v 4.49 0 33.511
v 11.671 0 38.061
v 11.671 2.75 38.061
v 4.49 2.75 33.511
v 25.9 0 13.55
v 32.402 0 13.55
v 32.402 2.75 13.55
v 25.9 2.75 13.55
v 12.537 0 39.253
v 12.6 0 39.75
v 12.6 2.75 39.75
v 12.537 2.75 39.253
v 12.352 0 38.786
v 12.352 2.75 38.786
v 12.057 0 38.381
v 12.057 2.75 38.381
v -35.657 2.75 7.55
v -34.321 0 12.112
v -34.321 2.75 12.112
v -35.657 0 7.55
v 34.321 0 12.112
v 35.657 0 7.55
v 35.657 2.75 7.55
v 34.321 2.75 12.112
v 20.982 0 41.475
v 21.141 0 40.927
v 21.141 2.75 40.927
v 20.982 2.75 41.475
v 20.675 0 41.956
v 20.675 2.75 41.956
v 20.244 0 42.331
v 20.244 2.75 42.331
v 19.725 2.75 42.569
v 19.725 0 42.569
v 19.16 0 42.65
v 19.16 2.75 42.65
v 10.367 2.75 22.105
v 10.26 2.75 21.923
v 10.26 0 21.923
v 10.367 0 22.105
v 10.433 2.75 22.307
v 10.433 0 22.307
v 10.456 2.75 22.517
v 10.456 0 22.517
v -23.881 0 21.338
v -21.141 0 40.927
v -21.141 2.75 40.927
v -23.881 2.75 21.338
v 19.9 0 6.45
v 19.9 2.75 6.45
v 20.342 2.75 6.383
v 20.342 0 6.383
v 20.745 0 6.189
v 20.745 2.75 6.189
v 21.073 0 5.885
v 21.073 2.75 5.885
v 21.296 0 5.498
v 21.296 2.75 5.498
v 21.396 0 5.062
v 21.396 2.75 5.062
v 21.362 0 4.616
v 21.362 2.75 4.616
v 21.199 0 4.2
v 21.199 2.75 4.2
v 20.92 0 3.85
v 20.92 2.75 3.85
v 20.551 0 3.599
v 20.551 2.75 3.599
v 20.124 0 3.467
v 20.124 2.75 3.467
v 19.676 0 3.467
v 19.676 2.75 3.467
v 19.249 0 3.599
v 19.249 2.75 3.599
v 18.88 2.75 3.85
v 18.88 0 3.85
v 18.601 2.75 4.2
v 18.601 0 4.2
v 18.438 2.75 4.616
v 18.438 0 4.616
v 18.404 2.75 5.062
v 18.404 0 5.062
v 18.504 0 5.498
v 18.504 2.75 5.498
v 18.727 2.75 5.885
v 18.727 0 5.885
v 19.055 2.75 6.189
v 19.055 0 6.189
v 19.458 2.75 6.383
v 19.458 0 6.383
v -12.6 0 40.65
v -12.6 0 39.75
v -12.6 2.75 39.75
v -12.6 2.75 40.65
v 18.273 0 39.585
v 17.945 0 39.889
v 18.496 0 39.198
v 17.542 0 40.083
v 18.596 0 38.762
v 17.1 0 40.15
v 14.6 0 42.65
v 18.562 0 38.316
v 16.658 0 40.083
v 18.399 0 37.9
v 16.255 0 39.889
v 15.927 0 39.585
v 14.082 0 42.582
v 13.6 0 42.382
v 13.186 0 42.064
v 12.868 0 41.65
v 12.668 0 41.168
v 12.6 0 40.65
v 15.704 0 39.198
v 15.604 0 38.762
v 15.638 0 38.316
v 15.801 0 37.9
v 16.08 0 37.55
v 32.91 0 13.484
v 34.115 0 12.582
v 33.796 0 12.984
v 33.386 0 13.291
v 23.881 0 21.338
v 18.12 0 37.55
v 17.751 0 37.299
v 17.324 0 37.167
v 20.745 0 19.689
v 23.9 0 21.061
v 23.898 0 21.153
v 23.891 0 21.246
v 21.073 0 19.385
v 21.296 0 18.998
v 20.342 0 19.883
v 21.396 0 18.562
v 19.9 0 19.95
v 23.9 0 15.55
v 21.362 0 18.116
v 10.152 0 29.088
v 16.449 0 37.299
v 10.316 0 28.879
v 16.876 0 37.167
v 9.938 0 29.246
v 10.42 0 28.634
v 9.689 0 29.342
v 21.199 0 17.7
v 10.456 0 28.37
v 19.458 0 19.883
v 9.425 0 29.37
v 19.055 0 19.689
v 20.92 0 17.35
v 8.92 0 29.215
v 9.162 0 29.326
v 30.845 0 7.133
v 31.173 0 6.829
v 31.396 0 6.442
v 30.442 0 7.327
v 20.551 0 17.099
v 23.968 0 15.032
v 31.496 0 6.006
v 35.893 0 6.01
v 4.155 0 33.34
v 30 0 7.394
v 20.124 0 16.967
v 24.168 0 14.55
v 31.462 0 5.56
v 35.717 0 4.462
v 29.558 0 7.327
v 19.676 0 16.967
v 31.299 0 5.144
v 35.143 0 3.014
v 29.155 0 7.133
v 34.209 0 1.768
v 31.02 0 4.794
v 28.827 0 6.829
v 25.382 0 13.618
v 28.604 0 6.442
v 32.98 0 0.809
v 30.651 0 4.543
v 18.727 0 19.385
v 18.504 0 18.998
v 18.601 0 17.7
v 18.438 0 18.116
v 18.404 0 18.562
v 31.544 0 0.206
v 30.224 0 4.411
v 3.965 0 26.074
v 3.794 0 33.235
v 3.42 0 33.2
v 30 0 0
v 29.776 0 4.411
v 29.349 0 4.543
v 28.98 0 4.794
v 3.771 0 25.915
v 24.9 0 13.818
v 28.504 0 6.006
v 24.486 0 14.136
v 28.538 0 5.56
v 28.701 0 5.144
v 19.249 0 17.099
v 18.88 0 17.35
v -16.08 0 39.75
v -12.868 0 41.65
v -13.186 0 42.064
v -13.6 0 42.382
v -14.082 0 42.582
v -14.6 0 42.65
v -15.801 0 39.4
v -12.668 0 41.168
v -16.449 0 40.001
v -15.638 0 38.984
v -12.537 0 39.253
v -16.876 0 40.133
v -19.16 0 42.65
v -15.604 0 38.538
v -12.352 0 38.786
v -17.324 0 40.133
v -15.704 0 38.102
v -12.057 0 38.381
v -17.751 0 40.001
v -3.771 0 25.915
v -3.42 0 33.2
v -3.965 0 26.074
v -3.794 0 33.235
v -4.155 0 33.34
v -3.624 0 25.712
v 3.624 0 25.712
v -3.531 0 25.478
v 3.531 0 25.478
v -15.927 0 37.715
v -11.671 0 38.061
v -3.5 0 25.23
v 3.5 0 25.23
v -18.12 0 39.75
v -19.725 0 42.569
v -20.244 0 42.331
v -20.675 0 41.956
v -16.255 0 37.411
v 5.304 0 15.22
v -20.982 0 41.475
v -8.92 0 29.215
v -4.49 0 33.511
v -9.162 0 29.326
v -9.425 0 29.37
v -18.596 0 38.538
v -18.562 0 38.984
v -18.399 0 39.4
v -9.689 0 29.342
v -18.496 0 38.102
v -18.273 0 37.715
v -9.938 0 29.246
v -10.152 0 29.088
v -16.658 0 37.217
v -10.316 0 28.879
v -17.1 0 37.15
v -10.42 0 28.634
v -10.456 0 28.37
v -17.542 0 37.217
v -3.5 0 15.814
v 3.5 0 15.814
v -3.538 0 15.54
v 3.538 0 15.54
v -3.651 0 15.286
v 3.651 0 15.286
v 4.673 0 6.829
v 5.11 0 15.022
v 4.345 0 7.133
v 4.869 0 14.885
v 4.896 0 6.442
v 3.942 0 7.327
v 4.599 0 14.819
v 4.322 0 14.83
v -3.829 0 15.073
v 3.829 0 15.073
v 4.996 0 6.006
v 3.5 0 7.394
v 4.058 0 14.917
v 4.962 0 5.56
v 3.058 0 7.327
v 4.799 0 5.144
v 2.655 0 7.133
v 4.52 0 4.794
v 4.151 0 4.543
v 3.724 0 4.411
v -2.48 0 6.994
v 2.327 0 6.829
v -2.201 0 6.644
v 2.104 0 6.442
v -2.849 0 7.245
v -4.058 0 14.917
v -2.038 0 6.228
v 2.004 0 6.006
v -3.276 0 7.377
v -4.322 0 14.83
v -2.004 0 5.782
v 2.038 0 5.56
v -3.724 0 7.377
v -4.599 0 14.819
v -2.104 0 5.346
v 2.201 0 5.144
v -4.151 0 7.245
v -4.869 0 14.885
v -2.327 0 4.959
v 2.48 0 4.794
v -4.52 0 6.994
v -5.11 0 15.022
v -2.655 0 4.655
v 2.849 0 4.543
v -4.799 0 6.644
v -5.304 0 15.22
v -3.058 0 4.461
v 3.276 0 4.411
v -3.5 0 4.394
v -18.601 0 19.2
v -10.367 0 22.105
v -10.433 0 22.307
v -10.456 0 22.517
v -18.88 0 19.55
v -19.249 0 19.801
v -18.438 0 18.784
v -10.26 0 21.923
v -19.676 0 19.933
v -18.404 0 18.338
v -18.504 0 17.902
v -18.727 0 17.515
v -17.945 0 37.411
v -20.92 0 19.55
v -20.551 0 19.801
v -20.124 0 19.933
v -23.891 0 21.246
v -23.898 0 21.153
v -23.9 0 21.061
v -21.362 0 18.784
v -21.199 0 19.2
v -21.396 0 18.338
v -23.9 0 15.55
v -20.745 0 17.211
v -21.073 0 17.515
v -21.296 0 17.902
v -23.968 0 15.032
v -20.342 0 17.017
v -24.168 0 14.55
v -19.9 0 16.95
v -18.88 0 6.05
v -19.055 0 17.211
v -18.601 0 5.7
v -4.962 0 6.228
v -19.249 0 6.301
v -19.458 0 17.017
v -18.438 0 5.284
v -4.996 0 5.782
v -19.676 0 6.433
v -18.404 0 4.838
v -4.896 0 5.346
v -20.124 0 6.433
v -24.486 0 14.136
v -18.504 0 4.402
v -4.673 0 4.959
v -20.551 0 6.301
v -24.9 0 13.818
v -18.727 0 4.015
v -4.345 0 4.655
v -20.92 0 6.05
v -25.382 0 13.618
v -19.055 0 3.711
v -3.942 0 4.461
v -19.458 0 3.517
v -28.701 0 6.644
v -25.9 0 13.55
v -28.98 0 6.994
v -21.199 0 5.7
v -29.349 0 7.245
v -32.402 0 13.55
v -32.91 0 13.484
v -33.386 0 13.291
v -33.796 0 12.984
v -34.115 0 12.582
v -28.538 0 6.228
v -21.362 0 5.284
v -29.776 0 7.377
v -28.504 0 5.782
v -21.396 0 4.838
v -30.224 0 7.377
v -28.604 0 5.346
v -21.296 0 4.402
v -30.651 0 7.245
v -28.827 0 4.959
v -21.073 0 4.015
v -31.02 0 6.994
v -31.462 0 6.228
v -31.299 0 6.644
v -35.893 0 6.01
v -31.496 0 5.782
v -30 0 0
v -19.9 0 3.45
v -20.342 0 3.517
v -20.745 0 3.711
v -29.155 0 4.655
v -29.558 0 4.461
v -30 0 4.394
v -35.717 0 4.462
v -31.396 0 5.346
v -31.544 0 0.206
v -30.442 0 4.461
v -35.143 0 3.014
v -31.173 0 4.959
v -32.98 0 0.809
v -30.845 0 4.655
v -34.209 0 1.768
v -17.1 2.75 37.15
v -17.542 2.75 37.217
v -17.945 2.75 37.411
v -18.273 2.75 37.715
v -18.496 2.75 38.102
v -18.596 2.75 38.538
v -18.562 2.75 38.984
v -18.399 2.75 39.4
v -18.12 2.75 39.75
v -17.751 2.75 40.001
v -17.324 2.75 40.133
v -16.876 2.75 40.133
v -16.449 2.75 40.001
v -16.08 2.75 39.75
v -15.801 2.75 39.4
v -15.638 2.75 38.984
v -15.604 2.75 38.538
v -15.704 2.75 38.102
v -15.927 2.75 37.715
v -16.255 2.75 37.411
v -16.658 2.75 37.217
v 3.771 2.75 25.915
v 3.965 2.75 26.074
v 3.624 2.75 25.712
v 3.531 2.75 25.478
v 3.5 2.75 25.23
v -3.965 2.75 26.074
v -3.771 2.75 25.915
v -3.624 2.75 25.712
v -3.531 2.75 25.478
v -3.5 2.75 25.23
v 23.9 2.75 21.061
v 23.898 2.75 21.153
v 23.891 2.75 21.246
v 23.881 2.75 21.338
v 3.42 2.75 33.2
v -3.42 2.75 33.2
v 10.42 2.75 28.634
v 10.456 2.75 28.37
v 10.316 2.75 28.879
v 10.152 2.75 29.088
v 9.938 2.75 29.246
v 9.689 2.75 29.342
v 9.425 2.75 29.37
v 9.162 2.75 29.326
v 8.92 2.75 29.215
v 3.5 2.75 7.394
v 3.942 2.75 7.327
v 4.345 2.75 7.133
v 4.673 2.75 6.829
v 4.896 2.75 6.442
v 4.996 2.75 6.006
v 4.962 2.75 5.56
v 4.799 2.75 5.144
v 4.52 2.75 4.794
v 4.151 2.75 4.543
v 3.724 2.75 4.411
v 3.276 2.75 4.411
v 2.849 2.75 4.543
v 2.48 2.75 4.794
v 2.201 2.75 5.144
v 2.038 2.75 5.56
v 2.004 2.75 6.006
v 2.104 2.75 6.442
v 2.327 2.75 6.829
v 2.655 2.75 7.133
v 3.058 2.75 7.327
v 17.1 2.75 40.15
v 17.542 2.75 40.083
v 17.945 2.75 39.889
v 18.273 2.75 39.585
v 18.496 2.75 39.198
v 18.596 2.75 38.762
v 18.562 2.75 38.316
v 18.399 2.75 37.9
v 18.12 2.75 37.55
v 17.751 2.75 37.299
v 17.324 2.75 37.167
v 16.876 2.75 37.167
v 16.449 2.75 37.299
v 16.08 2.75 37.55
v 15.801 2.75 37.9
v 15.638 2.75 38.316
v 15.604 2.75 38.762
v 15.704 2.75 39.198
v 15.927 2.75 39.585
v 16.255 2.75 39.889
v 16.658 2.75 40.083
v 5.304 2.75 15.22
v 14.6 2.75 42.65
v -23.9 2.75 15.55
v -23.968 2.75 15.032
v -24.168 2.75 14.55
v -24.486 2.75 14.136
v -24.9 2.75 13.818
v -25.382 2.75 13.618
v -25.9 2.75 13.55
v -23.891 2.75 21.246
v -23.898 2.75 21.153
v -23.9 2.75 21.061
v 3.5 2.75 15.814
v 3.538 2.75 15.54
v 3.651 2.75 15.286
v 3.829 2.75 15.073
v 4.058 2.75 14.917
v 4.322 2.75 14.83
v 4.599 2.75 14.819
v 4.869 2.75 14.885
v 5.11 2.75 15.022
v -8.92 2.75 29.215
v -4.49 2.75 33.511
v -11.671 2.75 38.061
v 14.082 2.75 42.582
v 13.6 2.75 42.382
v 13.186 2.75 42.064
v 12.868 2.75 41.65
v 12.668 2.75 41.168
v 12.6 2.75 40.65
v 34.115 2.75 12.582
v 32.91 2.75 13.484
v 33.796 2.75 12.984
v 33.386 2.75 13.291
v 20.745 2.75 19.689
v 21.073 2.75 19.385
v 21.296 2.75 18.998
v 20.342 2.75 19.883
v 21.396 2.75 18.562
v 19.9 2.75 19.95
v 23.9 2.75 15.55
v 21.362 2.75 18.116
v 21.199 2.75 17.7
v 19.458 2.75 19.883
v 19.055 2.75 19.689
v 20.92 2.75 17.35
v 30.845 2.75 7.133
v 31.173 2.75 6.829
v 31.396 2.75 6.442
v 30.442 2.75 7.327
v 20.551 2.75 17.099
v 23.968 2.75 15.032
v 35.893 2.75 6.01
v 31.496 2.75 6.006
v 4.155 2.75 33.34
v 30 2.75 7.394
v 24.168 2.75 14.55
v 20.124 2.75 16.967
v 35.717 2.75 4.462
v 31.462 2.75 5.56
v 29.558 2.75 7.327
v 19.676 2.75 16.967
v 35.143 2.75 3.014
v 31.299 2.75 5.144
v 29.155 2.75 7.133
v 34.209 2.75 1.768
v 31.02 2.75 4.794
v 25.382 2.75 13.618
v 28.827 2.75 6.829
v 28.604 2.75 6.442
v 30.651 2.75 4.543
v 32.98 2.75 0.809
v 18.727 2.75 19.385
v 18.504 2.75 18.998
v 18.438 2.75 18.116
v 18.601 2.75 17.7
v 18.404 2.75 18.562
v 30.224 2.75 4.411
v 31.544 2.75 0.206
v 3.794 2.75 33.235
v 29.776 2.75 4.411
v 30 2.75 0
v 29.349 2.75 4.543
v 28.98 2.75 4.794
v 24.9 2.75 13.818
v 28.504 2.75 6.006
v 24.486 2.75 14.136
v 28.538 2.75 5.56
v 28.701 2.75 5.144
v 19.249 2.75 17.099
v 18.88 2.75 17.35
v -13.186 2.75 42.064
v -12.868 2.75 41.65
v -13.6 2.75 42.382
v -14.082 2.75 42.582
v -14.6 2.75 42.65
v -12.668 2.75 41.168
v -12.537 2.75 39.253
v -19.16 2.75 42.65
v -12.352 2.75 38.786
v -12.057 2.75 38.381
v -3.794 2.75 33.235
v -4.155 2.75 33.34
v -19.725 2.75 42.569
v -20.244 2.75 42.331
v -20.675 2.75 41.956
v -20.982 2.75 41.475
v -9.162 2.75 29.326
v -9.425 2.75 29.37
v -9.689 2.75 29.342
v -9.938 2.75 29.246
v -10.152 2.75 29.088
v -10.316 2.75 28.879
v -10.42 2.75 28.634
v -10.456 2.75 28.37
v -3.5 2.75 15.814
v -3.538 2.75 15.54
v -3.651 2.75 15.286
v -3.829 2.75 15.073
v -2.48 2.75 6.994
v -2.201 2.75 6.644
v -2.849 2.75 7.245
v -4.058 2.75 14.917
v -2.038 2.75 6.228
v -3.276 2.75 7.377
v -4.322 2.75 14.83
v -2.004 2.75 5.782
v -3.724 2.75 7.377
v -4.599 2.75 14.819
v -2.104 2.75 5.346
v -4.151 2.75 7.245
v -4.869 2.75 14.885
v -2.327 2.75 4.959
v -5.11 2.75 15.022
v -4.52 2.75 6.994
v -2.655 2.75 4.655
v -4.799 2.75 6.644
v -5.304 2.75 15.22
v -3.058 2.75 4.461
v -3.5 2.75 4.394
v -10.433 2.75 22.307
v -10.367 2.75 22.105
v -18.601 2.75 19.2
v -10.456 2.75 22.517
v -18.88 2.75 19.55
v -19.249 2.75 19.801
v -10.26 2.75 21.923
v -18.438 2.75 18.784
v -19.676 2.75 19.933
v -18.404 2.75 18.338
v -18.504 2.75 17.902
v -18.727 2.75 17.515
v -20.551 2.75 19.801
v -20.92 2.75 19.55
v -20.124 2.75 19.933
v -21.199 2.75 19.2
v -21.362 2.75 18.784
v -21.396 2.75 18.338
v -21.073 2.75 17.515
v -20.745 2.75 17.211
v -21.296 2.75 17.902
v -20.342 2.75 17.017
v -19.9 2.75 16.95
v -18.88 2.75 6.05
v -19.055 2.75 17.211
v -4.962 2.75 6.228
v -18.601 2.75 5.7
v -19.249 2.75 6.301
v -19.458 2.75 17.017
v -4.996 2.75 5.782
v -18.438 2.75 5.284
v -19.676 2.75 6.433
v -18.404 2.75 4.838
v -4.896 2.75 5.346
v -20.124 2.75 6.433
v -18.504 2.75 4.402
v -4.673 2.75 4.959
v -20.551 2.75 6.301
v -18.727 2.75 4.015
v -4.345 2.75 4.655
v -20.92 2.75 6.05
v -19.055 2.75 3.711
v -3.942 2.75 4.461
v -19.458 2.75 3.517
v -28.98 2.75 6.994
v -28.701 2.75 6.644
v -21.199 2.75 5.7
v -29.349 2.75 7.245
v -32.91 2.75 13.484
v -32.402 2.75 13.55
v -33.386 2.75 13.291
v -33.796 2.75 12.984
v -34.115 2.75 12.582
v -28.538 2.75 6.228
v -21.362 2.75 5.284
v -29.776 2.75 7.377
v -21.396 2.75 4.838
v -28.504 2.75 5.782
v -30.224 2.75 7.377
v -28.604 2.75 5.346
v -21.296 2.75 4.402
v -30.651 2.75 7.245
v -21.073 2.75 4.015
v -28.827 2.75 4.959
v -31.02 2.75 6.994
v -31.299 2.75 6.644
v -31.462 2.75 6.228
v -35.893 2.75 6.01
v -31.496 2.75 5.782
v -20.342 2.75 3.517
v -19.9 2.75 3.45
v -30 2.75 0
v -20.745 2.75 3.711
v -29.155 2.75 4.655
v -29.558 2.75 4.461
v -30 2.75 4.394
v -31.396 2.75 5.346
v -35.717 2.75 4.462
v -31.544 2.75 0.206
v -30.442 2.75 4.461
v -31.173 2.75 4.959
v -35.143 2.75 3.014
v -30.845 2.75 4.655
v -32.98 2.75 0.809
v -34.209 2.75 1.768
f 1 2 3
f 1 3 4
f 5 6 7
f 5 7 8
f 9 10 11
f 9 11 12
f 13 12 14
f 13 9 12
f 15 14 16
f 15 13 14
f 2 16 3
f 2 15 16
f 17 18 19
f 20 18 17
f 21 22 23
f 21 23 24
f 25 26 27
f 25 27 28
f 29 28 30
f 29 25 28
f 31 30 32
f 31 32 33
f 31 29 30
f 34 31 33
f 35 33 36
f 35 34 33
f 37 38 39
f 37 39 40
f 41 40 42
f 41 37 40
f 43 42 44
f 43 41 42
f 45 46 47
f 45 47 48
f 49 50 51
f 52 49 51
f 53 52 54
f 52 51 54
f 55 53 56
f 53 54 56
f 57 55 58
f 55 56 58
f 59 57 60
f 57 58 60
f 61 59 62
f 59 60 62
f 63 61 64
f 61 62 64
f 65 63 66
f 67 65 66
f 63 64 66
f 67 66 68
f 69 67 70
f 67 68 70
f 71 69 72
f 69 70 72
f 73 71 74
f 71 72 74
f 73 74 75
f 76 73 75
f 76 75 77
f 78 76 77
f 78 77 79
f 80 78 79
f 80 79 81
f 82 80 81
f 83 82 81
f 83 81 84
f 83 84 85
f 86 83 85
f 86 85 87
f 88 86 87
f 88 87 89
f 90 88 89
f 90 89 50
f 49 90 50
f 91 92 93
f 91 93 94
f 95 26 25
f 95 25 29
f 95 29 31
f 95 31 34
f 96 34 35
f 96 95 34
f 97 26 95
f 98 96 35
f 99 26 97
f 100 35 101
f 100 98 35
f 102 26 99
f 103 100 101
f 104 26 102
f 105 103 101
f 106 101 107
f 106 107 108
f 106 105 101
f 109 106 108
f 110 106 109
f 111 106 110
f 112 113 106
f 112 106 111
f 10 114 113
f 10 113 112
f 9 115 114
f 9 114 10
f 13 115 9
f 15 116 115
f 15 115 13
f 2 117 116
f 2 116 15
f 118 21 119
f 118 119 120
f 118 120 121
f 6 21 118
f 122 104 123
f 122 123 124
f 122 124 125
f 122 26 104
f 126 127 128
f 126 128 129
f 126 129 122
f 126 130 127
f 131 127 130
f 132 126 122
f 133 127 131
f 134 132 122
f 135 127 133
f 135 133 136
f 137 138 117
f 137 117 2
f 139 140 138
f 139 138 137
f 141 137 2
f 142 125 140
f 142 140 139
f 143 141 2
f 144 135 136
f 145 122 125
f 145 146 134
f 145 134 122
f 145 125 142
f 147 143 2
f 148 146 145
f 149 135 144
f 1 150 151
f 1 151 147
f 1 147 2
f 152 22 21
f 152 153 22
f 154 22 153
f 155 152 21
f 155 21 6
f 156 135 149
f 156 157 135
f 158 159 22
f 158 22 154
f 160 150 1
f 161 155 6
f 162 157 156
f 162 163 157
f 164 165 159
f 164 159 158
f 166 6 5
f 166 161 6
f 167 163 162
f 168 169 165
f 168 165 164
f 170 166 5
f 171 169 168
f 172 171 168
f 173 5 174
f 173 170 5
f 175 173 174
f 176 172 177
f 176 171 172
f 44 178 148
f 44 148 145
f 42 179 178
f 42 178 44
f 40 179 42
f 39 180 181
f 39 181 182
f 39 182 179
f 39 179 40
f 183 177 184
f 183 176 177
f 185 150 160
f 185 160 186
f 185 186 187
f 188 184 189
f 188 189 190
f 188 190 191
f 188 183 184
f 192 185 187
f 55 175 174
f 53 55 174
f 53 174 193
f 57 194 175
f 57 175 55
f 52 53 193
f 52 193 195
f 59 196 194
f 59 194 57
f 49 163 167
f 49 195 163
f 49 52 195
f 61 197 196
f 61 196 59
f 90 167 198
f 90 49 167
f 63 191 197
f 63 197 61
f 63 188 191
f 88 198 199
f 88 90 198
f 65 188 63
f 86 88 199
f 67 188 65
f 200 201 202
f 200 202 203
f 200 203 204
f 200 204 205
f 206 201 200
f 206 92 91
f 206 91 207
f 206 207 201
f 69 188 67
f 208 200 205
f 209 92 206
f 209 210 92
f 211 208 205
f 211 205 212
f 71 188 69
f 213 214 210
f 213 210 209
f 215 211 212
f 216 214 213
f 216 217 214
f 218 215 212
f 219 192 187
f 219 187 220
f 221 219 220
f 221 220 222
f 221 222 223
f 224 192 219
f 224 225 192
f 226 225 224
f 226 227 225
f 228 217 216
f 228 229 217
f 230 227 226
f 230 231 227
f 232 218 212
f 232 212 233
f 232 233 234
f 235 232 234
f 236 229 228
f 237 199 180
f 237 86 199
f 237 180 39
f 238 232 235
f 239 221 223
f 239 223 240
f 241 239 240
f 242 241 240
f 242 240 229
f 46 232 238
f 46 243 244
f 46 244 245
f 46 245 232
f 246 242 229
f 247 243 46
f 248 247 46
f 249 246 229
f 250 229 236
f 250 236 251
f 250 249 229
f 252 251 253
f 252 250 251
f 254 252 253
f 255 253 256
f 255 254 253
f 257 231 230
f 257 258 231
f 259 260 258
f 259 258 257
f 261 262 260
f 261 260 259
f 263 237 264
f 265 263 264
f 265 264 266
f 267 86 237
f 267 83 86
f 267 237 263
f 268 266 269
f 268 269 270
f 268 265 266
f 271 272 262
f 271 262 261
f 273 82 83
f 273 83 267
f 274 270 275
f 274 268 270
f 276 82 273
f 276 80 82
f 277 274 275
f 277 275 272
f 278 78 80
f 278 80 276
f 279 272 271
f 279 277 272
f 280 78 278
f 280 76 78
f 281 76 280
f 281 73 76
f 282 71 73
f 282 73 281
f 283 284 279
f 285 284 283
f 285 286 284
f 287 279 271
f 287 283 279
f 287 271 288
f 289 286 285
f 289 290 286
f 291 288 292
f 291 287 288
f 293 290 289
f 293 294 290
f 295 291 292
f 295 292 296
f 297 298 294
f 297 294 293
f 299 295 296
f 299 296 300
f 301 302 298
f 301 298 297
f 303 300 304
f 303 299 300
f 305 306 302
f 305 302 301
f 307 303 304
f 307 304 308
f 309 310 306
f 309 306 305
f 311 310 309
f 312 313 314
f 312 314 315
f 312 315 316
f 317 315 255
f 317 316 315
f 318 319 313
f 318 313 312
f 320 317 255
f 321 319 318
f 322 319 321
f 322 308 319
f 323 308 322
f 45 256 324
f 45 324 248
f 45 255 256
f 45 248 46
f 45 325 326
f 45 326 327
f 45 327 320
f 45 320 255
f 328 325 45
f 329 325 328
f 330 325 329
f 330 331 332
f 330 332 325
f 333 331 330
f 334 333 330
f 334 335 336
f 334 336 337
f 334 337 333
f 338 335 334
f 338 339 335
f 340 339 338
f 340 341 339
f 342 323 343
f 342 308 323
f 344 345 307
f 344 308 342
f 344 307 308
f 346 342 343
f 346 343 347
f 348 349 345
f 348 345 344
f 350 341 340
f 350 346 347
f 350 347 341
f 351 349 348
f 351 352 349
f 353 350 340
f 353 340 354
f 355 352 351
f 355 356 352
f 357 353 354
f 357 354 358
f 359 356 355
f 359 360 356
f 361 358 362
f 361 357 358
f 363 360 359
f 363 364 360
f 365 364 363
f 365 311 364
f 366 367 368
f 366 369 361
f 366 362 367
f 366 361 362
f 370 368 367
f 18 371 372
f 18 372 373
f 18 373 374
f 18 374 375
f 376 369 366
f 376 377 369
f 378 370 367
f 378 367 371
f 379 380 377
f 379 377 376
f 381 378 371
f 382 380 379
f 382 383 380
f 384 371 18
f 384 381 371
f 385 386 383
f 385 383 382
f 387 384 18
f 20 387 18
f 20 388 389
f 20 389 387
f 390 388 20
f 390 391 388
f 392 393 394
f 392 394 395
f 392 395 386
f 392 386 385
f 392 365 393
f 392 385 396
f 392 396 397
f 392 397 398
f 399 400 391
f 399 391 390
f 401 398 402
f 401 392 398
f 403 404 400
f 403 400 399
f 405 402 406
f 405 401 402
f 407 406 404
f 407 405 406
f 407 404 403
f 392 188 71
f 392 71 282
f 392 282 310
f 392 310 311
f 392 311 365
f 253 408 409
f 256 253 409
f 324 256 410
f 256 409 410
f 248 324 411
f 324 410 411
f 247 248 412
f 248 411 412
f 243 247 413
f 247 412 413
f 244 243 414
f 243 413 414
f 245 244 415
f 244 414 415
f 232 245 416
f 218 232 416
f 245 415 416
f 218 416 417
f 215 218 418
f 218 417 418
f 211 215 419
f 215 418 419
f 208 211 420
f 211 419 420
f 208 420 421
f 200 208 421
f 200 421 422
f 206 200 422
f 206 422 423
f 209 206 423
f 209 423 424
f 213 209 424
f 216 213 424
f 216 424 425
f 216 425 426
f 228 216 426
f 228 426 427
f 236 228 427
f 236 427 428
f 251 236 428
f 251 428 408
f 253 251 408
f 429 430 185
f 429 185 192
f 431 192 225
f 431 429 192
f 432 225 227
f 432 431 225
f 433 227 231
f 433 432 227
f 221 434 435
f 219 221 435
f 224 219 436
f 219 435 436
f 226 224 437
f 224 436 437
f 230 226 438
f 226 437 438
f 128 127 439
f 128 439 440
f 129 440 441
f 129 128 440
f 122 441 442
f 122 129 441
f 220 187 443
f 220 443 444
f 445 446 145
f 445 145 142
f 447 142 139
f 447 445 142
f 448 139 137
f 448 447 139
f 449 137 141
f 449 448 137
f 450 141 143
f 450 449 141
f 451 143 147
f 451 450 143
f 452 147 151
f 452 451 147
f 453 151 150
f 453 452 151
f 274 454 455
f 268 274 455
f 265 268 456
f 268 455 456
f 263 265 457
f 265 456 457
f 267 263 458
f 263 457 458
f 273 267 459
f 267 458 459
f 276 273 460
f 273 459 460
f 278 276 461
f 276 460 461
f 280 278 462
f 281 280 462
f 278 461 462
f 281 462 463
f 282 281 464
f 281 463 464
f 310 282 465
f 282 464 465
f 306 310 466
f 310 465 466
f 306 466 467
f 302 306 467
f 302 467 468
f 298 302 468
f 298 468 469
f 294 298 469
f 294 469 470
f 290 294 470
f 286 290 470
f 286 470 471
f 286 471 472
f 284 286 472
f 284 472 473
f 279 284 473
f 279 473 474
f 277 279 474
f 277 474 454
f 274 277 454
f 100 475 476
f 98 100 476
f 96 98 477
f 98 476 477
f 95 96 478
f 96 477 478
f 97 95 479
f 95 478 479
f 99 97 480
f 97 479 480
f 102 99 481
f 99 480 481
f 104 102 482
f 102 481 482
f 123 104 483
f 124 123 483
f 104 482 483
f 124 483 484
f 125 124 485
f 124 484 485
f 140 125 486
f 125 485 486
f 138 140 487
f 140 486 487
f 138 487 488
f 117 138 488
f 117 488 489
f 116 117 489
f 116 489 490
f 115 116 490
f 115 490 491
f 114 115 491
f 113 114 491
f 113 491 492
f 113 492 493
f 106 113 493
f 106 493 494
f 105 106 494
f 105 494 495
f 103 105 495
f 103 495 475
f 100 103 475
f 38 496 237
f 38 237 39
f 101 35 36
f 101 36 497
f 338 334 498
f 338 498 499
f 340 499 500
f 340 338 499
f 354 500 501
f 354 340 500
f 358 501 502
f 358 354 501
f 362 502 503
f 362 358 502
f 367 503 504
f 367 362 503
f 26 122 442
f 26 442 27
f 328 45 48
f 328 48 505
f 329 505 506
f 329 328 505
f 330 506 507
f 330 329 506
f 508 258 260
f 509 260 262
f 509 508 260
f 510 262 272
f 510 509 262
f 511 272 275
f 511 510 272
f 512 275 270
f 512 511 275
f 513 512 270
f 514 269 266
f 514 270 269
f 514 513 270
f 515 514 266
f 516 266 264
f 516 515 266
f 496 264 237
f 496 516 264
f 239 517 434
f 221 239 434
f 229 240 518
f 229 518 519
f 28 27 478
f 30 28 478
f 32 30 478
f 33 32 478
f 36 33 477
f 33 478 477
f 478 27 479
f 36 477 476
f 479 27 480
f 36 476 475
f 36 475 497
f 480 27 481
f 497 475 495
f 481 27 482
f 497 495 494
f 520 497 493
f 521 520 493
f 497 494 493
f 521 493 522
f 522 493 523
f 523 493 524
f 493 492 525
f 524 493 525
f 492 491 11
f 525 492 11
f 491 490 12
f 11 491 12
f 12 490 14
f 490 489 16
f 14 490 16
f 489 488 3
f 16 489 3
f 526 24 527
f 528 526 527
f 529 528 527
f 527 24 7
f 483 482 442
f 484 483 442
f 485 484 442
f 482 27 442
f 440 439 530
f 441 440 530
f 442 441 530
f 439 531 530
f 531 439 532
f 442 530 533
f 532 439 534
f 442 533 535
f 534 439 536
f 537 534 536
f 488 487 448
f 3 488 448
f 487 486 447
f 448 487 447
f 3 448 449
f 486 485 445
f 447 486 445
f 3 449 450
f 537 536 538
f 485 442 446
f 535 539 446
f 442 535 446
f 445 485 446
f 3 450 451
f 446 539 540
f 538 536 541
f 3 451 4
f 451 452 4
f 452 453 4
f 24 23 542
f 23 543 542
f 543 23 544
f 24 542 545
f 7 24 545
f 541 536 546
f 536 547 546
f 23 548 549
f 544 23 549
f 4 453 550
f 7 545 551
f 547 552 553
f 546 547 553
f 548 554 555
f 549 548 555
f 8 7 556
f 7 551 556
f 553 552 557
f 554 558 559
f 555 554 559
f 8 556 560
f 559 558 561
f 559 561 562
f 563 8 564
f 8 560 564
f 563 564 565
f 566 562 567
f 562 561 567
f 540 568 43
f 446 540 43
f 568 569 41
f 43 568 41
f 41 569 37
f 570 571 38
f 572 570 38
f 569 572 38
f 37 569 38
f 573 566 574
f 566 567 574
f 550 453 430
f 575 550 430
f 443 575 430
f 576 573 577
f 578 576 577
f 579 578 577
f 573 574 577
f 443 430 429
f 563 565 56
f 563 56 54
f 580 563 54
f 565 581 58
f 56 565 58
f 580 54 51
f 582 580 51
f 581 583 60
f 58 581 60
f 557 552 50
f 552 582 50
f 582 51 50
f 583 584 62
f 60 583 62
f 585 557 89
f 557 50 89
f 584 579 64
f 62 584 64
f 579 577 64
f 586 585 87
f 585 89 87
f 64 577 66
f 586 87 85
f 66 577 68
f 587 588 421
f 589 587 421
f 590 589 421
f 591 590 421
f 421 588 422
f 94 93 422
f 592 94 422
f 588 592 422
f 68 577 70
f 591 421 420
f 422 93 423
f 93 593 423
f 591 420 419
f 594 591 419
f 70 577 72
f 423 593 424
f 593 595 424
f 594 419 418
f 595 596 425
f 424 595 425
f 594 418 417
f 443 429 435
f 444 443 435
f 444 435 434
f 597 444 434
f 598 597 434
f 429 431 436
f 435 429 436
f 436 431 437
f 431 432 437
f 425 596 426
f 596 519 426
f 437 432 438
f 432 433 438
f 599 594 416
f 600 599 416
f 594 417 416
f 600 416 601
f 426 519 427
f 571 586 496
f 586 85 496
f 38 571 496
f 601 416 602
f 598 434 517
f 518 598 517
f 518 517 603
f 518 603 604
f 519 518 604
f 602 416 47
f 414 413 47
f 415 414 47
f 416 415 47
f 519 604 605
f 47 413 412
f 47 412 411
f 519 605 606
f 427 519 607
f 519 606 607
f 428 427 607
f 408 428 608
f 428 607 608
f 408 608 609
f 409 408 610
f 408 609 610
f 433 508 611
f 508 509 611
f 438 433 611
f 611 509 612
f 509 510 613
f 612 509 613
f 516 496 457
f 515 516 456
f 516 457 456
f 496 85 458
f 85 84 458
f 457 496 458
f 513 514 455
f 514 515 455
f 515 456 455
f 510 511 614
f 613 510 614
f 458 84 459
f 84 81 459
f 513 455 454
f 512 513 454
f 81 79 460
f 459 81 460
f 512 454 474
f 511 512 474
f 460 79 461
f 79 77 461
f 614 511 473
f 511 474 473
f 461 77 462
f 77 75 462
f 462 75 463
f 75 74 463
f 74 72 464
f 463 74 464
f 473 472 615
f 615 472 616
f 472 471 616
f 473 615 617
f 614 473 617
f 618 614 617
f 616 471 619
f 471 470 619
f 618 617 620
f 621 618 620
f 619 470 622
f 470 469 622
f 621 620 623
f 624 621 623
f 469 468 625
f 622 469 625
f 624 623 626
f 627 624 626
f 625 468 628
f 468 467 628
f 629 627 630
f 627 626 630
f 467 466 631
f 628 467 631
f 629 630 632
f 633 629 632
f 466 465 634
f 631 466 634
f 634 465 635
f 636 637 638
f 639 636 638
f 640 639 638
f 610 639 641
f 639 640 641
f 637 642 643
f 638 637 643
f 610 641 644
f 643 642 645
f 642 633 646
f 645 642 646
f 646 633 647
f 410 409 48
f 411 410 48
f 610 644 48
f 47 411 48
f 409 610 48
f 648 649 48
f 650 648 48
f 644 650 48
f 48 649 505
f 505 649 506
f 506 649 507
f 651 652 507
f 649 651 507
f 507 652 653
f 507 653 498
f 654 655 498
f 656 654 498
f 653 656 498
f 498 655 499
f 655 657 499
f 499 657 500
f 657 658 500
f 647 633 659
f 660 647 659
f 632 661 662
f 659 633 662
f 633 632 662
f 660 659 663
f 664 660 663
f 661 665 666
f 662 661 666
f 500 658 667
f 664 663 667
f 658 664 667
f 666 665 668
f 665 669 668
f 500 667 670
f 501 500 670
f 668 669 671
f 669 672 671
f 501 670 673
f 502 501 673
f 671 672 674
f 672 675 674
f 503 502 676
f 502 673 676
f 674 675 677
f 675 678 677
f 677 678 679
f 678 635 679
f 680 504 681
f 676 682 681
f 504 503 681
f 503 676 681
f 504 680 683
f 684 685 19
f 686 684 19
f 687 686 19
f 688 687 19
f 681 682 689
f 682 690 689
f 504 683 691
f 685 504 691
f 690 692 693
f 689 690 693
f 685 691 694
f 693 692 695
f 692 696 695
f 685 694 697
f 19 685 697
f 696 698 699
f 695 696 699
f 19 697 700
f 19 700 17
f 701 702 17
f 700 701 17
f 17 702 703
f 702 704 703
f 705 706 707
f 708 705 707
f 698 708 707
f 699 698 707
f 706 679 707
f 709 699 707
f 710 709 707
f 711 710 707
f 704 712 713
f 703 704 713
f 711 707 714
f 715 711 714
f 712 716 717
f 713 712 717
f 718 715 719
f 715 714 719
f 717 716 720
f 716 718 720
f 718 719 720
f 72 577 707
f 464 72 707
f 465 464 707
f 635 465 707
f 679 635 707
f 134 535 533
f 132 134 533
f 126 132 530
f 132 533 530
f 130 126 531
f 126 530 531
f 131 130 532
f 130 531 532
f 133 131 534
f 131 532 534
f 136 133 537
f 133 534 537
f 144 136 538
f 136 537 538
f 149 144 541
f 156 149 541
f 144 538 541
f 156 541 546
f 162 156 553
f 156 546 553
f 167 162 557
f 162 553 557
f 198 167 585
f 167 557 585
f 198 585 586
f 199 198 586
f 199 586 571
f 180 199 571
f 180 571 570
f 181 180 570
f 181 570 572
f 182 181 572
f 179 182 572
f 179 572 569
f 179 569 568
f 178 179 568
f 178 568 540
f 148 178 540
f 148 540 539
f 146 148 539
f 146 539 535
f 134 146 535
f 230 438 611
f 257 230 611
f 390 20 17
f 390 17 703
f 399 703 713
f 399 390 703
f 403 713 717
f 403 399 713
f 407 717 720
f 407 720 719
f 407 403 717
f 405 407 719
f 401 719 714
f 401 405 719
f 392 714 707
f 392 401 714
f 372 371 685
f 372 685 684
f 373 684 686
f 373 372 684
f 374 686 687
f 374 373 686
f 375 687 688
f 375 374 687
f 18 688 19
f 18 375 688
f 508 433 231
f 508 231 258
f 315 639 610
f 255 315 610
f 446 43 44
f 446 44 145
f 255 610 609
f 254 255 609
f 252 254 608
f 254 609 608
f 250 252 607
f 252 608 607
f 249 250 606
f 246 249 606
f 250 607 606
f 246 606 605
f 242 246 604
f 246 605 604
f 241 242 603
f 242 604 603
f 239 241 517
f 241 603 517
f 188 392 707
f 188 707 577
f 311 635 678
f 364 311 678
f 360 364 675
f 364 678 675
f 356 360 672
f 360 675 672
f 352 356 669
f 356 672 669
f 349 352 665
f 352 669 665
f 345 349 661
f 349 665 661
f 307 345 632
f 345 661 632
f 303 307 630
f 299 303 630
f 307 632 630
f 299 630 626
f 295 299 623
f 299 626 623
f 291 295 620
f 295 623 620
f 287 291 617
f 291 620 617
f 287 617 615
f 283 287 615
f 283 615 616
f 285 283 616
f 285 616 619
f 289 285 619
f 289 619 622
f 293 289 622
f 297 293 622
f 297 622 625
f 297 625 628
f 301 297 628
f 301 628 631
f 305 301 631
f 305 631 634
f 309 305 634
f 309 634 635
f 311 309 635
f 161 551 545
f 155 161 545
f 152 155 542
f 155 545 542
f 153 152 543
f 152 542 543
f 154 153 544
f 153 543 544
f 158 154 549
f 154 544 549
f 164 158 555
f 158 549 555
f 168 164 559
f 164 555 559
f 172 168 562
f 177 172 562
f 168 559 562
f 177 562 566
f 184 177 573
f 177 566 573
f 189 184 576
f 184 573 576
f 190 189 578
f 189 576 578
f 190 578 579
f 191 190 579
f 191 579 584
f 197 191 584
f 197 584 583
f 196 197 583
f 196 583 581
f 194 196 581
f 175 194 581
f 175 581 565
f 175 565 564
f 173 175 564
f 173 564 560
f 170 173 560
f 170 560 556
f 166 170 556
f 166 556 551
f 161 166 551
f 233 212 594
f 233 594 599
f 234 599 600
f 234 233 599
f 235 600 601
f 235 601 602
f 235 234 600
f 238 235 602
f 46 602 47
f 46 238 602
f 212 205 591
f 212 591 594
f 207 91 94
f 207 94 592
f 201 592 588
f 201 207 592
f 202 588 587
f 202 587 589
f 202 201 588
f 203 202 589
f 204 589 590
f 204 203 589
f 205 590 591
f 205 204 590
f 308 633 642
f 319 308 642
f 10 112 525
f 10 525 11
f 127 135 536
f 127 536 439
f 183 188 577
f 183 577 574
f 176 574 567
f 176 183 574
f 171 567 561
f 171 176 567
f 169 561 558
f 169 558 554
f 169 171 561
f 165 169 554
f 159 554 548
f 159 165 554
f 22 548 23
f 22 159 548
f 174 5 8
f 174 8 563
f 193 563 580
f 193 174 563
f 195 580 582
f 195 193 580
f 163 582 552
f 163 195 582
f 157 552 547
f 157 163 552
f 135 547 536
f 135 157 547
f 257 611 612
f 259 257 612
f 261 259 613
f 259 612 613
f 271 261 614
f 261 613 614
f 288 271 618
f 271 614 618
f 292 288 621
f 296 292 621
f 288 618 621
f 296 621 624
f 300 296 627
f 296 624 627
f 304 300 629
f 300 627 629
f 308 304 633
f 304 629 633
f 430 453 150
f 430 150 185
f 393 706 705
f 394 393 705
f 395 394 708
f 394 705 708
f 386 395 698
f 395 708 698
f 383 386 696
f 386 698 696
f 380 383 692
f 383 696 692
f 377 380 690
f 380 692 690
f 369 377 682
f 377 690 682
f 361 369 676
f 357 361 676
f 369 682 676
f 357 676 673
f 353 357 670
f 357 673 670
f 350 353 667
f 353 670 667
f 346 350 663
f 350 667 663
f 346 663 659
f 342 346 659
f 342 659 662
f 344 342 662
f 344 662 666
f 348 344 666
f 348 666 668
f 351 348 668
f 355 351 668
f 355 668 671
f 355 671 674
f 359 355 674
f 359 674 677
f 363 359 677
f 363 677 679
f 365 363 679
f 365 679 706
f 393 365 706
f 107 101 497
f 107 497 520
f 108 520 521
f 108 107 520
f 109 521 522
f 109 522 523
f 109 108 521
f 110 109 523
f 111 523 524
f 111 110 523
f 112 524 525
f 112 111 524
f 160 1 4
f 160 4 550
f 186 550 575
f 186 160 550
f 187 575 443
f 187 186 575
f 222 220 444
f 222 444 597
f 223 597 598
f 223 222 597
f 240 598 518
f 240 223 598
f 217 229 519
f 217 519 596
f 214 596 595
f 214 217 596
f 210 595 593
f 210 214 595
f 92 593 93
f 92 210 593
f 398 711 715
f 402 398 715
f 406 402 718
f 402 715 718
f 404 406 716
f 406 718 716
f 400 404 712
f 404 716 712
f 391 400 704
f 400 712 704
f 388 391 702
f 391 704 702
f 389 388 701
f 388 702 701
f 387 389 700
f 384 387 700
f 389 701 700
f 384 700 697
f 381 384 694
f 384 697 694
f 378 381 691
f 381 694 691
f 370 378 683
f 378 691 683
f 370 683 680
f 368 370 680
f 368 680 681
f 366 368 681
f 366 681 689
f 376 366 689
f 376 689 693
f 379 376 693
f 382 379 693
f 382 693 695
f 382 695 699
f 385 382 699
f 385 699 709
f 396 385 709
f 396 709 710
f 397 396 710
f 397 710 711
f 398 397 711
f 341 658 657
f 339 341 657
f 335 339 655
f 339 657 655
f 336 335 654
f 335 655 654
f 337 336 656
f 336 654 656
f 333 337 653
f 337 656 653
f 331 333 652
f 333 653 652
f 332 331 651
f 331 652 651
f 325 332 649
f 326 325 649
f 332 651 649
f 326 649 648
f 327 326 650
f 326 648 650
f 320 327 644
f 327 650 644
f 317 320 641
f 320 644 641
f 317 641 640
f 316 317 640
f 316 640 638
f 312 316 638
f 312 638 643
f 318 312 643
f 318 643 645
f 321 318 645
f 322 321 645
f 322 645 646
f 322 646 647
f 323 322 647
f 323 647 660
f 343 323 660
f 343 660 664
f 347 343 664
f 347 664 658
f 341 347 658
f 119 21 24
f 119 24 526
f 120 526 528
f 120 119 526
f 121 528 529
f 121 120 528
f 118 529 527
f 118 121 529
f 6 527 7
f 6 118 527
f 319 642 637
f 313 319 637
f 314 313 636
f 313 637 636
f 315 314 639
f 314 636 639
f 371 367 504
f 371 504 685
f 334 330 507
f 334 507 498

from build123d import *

# Parameters (mm, degrees)
RESSALTO_EXTRUS_O1_DEPTH = 2.75
ESBO_O4_R                = 1.5
CORTE_EXTRUS_O1_DEPTH    = 56.81185506


with BuildPart() as part:
    # Esboço3 → Ressalto-extrusão1 (new body)
    with BuildSketch(Plane(origin=(0, 0, 0), x_dir=(1, 0, 0), z_dir=(0, 1, 0))):
        with BuildLine():
            Line((-30, 0), (30, 0))
            ThreePointArc((30, 0), (34.716968698, -2.359969453), (35.656560331, -7.55))
            Line((35.656560331, -7.55), (34.321008321, -12.111933867))
            ThreePointArc((34.321008321, -12.111933867), (33.600767374, -13.150604219), (32.401573422, -13.55))
            Line((32.401573422, -13.55), (25.9, -13.55))
            ThreePointArc((25.9, -13.55), (24.485786438, -14.135786438), (23.9, -15.55))
            Line((23.9, -15.55), (23.9, -21.060817198))
            ThreePointArc((23.9, -21.060817198), (23.895174557, -21.199664191), (23.880721513, -21.337841185))
            Line((23.880721513, -21.337841185), (21.140975666, -40.927023988))
            ThreePointArc((21.140975666, -40.927023988), (20.472875962, -42.158981109), (19.160254154, -42.65))
            Line((19.160254154, -42.65), (14.6, -42.65))
            ThreePointArc((14.6, -42.65), (13.185786438, -42.064213562), (12.6, -40.65))
            Line((12.6, -40.65), (12.6, -39.750343786))
            ThreePointArc((12.6, -39.750343786), (12.352304612, -38.786275041), (11.670571453, -38.061001677))
            Line((11.670571453, -38.061001677), (4.490212451, -33.51065789))
            ThreePointArc((4.490212451, -33.51065789), (3.977007924, -33.279233978), (3.419640998, -33.2))
            Line((3.419640998, -33.2), (-3.419640998, -33.2))
            ThreePointArc((-3.419640998, -33.2), (-3.977007924, -33.279233978), (-4.490212451, -33.51065789))
            Line((-4.490212451, -33.51065789), (-11.670571453, -38.061001677))
            ThreePointArc((-11.670571453, -38.061001677), (-12.352304612, -38.786275041), (-12.6, -39.750343786))
            Line((-12.6, -39.750343786), (-12.6, -40.65))
            ThreePointArc((-12.6, -40.65), (-13.185786438, -42.064213562), (-14.6, -42.65))
            Line((-14.6, -42.65), (-19.160254154, -42.65))
            ThreePointArc((-19.160254154, -42.65), (-20.472875962, -42.158981109), (-21.140975666, -40.927023988))
            Line((-21.140975666, -40.927023988), (-23.880721513, -21.337841185))
            ThreePointArc((-23.880721513, -21.337841185), (-23.895174557, -21.199664191), (-23.9, -21.060817198))
            Line((-23.9, -21.060817198), (-23.9, -15.55))
            ThreePointArc((-23.9, -15.55), (-24.485786438, -14.135786438), (-25.9, -13.55))
            Line((-25.9, -13.55), (-32.401573422, -13.55))
            ThreePointArc((-32.401573422, -13.55), (-33.600767374, -13.150604219), (-34.321008321, -12.111933867))
            Line((-34.321008321, -12.111933867), (-35.656560331, -7.55))
            ThreePointArc((-35.656560331, -7.55), (-34.716968698, -2.359969453), (-30, 0))
        make_face()
    extrude(amount=RESSALTO_EXTRUS_O1_DEPTH)

    # Esboço4 → Corte-extrusão1 (cut, through all)
    with BuildSketch(Plane(origin=(0, 2.75, 0), x_dir=(1, 0, 0), z_dir=(0, 1, 0))):
        with Locations(Location((3.5, -5.893985085, 0), (0, 0, 270))):
            Circle(ESBO_O4_R)
        with Locations(Location((30, -5.893985085, 0), (0, 0, 270))):
            Circle(ESBO_O4_R)
        with Locations(Location((19.9, -4.95, 0), (0, 0, 270))):
            Circle(ESBO_O4_R)
        with Locations(Location((19.9, -18.45, 0), (0, 0, 270))):
            Circle(ESBO_O4_R)
        with Locations(Location((17.1, -38.65, 0), (0, 0, 270))):
            Circle(ESBO_O4_R)
        with Locations(Location((-3.5, -5.893985085, 0), (0, 0, 90))):
            Circle(ESBO_O4_R)
        with Locations(Location((-17.1, -38.65, 0), (0, 0, 90))):
            Circle(ESBO_O4_R)
        with Locations(Location((-19.9, -18.45, 0), (0, 0, 90))):
            Circle(ESBO_O4_R)
        with Locations(Location((-19.9, -4.95, 0), (0, 0, 90))):
            Circle(ESBO_O4_R)
        with Locations(Location((-30, -5.893985085, 0), (0, 0, 90))):
            Circle(ESBO_O4_R)
        with BuildLine():
            Line((3.5, -25.229610701), (3.5, -15.814435009))
            ThreePointArc((3.5, -15.814435009), (4.187027668, -14.864672766), (5.304096639, -15.219936401))
            Line((5.304096639, -15.219936401), (10.25973036, -21.922741689))
            ThreePointArc((10.25973036, -21.922741689), (10.405395965, -22.204267965), (10.455633721, -22.517240297))
            Line((10.455633721, -22.517240297), (10.455633721, -28.370099513))
            ThreePointArc((10.455633721, -28.370099513), (9.937668094, -29.246251819), (8.920347995, -29.214770568))
            Line((8.920347995, -29.214770568), (3.964714273, -26.074281756))
            ThreePointArc((3.964714273, -26.074281756), (3.623847694, -25.711645074), (3.5, -25.229610701))
        make_face()
        with BuildLine():
            Line((-8.920347995, -29.214770568), (-3.964714273, -26.074281756))
            ThreePointArc((-3.964714273, -26.074281756), (-3.623847694, -25.711645074), (-3.5, -25.229610701))
            Line((-3.5, -25.229610701), (-3.5, -15.814435009))
            ThreePointArc((-3.5, -15.814435009), (-4.187027668, -14.864672766), (-5.304096639, -15.219936401))
            Line((-5.304096639, -15.219936401), (-10.25973036, -21.922741689))
            ThreePointArc((-10.25973036, -21.922741689), (-10.405395965, -22.204267965), (-10.455633721, -22.517240297))
            Line((-10.455633721, -22.517240297), (-10.455633721, -28.370099513))
            ThreePointArc((-10.455633721, -28.370099513), (-9.937668094, -29.246251819), (-8.920347995, -29.214770568))
        make_face()
    extrude(amount=-CORTE_EXTRUS_O1_DEPTH, mode=Mode.SUBTRACT)


solid = part.part
